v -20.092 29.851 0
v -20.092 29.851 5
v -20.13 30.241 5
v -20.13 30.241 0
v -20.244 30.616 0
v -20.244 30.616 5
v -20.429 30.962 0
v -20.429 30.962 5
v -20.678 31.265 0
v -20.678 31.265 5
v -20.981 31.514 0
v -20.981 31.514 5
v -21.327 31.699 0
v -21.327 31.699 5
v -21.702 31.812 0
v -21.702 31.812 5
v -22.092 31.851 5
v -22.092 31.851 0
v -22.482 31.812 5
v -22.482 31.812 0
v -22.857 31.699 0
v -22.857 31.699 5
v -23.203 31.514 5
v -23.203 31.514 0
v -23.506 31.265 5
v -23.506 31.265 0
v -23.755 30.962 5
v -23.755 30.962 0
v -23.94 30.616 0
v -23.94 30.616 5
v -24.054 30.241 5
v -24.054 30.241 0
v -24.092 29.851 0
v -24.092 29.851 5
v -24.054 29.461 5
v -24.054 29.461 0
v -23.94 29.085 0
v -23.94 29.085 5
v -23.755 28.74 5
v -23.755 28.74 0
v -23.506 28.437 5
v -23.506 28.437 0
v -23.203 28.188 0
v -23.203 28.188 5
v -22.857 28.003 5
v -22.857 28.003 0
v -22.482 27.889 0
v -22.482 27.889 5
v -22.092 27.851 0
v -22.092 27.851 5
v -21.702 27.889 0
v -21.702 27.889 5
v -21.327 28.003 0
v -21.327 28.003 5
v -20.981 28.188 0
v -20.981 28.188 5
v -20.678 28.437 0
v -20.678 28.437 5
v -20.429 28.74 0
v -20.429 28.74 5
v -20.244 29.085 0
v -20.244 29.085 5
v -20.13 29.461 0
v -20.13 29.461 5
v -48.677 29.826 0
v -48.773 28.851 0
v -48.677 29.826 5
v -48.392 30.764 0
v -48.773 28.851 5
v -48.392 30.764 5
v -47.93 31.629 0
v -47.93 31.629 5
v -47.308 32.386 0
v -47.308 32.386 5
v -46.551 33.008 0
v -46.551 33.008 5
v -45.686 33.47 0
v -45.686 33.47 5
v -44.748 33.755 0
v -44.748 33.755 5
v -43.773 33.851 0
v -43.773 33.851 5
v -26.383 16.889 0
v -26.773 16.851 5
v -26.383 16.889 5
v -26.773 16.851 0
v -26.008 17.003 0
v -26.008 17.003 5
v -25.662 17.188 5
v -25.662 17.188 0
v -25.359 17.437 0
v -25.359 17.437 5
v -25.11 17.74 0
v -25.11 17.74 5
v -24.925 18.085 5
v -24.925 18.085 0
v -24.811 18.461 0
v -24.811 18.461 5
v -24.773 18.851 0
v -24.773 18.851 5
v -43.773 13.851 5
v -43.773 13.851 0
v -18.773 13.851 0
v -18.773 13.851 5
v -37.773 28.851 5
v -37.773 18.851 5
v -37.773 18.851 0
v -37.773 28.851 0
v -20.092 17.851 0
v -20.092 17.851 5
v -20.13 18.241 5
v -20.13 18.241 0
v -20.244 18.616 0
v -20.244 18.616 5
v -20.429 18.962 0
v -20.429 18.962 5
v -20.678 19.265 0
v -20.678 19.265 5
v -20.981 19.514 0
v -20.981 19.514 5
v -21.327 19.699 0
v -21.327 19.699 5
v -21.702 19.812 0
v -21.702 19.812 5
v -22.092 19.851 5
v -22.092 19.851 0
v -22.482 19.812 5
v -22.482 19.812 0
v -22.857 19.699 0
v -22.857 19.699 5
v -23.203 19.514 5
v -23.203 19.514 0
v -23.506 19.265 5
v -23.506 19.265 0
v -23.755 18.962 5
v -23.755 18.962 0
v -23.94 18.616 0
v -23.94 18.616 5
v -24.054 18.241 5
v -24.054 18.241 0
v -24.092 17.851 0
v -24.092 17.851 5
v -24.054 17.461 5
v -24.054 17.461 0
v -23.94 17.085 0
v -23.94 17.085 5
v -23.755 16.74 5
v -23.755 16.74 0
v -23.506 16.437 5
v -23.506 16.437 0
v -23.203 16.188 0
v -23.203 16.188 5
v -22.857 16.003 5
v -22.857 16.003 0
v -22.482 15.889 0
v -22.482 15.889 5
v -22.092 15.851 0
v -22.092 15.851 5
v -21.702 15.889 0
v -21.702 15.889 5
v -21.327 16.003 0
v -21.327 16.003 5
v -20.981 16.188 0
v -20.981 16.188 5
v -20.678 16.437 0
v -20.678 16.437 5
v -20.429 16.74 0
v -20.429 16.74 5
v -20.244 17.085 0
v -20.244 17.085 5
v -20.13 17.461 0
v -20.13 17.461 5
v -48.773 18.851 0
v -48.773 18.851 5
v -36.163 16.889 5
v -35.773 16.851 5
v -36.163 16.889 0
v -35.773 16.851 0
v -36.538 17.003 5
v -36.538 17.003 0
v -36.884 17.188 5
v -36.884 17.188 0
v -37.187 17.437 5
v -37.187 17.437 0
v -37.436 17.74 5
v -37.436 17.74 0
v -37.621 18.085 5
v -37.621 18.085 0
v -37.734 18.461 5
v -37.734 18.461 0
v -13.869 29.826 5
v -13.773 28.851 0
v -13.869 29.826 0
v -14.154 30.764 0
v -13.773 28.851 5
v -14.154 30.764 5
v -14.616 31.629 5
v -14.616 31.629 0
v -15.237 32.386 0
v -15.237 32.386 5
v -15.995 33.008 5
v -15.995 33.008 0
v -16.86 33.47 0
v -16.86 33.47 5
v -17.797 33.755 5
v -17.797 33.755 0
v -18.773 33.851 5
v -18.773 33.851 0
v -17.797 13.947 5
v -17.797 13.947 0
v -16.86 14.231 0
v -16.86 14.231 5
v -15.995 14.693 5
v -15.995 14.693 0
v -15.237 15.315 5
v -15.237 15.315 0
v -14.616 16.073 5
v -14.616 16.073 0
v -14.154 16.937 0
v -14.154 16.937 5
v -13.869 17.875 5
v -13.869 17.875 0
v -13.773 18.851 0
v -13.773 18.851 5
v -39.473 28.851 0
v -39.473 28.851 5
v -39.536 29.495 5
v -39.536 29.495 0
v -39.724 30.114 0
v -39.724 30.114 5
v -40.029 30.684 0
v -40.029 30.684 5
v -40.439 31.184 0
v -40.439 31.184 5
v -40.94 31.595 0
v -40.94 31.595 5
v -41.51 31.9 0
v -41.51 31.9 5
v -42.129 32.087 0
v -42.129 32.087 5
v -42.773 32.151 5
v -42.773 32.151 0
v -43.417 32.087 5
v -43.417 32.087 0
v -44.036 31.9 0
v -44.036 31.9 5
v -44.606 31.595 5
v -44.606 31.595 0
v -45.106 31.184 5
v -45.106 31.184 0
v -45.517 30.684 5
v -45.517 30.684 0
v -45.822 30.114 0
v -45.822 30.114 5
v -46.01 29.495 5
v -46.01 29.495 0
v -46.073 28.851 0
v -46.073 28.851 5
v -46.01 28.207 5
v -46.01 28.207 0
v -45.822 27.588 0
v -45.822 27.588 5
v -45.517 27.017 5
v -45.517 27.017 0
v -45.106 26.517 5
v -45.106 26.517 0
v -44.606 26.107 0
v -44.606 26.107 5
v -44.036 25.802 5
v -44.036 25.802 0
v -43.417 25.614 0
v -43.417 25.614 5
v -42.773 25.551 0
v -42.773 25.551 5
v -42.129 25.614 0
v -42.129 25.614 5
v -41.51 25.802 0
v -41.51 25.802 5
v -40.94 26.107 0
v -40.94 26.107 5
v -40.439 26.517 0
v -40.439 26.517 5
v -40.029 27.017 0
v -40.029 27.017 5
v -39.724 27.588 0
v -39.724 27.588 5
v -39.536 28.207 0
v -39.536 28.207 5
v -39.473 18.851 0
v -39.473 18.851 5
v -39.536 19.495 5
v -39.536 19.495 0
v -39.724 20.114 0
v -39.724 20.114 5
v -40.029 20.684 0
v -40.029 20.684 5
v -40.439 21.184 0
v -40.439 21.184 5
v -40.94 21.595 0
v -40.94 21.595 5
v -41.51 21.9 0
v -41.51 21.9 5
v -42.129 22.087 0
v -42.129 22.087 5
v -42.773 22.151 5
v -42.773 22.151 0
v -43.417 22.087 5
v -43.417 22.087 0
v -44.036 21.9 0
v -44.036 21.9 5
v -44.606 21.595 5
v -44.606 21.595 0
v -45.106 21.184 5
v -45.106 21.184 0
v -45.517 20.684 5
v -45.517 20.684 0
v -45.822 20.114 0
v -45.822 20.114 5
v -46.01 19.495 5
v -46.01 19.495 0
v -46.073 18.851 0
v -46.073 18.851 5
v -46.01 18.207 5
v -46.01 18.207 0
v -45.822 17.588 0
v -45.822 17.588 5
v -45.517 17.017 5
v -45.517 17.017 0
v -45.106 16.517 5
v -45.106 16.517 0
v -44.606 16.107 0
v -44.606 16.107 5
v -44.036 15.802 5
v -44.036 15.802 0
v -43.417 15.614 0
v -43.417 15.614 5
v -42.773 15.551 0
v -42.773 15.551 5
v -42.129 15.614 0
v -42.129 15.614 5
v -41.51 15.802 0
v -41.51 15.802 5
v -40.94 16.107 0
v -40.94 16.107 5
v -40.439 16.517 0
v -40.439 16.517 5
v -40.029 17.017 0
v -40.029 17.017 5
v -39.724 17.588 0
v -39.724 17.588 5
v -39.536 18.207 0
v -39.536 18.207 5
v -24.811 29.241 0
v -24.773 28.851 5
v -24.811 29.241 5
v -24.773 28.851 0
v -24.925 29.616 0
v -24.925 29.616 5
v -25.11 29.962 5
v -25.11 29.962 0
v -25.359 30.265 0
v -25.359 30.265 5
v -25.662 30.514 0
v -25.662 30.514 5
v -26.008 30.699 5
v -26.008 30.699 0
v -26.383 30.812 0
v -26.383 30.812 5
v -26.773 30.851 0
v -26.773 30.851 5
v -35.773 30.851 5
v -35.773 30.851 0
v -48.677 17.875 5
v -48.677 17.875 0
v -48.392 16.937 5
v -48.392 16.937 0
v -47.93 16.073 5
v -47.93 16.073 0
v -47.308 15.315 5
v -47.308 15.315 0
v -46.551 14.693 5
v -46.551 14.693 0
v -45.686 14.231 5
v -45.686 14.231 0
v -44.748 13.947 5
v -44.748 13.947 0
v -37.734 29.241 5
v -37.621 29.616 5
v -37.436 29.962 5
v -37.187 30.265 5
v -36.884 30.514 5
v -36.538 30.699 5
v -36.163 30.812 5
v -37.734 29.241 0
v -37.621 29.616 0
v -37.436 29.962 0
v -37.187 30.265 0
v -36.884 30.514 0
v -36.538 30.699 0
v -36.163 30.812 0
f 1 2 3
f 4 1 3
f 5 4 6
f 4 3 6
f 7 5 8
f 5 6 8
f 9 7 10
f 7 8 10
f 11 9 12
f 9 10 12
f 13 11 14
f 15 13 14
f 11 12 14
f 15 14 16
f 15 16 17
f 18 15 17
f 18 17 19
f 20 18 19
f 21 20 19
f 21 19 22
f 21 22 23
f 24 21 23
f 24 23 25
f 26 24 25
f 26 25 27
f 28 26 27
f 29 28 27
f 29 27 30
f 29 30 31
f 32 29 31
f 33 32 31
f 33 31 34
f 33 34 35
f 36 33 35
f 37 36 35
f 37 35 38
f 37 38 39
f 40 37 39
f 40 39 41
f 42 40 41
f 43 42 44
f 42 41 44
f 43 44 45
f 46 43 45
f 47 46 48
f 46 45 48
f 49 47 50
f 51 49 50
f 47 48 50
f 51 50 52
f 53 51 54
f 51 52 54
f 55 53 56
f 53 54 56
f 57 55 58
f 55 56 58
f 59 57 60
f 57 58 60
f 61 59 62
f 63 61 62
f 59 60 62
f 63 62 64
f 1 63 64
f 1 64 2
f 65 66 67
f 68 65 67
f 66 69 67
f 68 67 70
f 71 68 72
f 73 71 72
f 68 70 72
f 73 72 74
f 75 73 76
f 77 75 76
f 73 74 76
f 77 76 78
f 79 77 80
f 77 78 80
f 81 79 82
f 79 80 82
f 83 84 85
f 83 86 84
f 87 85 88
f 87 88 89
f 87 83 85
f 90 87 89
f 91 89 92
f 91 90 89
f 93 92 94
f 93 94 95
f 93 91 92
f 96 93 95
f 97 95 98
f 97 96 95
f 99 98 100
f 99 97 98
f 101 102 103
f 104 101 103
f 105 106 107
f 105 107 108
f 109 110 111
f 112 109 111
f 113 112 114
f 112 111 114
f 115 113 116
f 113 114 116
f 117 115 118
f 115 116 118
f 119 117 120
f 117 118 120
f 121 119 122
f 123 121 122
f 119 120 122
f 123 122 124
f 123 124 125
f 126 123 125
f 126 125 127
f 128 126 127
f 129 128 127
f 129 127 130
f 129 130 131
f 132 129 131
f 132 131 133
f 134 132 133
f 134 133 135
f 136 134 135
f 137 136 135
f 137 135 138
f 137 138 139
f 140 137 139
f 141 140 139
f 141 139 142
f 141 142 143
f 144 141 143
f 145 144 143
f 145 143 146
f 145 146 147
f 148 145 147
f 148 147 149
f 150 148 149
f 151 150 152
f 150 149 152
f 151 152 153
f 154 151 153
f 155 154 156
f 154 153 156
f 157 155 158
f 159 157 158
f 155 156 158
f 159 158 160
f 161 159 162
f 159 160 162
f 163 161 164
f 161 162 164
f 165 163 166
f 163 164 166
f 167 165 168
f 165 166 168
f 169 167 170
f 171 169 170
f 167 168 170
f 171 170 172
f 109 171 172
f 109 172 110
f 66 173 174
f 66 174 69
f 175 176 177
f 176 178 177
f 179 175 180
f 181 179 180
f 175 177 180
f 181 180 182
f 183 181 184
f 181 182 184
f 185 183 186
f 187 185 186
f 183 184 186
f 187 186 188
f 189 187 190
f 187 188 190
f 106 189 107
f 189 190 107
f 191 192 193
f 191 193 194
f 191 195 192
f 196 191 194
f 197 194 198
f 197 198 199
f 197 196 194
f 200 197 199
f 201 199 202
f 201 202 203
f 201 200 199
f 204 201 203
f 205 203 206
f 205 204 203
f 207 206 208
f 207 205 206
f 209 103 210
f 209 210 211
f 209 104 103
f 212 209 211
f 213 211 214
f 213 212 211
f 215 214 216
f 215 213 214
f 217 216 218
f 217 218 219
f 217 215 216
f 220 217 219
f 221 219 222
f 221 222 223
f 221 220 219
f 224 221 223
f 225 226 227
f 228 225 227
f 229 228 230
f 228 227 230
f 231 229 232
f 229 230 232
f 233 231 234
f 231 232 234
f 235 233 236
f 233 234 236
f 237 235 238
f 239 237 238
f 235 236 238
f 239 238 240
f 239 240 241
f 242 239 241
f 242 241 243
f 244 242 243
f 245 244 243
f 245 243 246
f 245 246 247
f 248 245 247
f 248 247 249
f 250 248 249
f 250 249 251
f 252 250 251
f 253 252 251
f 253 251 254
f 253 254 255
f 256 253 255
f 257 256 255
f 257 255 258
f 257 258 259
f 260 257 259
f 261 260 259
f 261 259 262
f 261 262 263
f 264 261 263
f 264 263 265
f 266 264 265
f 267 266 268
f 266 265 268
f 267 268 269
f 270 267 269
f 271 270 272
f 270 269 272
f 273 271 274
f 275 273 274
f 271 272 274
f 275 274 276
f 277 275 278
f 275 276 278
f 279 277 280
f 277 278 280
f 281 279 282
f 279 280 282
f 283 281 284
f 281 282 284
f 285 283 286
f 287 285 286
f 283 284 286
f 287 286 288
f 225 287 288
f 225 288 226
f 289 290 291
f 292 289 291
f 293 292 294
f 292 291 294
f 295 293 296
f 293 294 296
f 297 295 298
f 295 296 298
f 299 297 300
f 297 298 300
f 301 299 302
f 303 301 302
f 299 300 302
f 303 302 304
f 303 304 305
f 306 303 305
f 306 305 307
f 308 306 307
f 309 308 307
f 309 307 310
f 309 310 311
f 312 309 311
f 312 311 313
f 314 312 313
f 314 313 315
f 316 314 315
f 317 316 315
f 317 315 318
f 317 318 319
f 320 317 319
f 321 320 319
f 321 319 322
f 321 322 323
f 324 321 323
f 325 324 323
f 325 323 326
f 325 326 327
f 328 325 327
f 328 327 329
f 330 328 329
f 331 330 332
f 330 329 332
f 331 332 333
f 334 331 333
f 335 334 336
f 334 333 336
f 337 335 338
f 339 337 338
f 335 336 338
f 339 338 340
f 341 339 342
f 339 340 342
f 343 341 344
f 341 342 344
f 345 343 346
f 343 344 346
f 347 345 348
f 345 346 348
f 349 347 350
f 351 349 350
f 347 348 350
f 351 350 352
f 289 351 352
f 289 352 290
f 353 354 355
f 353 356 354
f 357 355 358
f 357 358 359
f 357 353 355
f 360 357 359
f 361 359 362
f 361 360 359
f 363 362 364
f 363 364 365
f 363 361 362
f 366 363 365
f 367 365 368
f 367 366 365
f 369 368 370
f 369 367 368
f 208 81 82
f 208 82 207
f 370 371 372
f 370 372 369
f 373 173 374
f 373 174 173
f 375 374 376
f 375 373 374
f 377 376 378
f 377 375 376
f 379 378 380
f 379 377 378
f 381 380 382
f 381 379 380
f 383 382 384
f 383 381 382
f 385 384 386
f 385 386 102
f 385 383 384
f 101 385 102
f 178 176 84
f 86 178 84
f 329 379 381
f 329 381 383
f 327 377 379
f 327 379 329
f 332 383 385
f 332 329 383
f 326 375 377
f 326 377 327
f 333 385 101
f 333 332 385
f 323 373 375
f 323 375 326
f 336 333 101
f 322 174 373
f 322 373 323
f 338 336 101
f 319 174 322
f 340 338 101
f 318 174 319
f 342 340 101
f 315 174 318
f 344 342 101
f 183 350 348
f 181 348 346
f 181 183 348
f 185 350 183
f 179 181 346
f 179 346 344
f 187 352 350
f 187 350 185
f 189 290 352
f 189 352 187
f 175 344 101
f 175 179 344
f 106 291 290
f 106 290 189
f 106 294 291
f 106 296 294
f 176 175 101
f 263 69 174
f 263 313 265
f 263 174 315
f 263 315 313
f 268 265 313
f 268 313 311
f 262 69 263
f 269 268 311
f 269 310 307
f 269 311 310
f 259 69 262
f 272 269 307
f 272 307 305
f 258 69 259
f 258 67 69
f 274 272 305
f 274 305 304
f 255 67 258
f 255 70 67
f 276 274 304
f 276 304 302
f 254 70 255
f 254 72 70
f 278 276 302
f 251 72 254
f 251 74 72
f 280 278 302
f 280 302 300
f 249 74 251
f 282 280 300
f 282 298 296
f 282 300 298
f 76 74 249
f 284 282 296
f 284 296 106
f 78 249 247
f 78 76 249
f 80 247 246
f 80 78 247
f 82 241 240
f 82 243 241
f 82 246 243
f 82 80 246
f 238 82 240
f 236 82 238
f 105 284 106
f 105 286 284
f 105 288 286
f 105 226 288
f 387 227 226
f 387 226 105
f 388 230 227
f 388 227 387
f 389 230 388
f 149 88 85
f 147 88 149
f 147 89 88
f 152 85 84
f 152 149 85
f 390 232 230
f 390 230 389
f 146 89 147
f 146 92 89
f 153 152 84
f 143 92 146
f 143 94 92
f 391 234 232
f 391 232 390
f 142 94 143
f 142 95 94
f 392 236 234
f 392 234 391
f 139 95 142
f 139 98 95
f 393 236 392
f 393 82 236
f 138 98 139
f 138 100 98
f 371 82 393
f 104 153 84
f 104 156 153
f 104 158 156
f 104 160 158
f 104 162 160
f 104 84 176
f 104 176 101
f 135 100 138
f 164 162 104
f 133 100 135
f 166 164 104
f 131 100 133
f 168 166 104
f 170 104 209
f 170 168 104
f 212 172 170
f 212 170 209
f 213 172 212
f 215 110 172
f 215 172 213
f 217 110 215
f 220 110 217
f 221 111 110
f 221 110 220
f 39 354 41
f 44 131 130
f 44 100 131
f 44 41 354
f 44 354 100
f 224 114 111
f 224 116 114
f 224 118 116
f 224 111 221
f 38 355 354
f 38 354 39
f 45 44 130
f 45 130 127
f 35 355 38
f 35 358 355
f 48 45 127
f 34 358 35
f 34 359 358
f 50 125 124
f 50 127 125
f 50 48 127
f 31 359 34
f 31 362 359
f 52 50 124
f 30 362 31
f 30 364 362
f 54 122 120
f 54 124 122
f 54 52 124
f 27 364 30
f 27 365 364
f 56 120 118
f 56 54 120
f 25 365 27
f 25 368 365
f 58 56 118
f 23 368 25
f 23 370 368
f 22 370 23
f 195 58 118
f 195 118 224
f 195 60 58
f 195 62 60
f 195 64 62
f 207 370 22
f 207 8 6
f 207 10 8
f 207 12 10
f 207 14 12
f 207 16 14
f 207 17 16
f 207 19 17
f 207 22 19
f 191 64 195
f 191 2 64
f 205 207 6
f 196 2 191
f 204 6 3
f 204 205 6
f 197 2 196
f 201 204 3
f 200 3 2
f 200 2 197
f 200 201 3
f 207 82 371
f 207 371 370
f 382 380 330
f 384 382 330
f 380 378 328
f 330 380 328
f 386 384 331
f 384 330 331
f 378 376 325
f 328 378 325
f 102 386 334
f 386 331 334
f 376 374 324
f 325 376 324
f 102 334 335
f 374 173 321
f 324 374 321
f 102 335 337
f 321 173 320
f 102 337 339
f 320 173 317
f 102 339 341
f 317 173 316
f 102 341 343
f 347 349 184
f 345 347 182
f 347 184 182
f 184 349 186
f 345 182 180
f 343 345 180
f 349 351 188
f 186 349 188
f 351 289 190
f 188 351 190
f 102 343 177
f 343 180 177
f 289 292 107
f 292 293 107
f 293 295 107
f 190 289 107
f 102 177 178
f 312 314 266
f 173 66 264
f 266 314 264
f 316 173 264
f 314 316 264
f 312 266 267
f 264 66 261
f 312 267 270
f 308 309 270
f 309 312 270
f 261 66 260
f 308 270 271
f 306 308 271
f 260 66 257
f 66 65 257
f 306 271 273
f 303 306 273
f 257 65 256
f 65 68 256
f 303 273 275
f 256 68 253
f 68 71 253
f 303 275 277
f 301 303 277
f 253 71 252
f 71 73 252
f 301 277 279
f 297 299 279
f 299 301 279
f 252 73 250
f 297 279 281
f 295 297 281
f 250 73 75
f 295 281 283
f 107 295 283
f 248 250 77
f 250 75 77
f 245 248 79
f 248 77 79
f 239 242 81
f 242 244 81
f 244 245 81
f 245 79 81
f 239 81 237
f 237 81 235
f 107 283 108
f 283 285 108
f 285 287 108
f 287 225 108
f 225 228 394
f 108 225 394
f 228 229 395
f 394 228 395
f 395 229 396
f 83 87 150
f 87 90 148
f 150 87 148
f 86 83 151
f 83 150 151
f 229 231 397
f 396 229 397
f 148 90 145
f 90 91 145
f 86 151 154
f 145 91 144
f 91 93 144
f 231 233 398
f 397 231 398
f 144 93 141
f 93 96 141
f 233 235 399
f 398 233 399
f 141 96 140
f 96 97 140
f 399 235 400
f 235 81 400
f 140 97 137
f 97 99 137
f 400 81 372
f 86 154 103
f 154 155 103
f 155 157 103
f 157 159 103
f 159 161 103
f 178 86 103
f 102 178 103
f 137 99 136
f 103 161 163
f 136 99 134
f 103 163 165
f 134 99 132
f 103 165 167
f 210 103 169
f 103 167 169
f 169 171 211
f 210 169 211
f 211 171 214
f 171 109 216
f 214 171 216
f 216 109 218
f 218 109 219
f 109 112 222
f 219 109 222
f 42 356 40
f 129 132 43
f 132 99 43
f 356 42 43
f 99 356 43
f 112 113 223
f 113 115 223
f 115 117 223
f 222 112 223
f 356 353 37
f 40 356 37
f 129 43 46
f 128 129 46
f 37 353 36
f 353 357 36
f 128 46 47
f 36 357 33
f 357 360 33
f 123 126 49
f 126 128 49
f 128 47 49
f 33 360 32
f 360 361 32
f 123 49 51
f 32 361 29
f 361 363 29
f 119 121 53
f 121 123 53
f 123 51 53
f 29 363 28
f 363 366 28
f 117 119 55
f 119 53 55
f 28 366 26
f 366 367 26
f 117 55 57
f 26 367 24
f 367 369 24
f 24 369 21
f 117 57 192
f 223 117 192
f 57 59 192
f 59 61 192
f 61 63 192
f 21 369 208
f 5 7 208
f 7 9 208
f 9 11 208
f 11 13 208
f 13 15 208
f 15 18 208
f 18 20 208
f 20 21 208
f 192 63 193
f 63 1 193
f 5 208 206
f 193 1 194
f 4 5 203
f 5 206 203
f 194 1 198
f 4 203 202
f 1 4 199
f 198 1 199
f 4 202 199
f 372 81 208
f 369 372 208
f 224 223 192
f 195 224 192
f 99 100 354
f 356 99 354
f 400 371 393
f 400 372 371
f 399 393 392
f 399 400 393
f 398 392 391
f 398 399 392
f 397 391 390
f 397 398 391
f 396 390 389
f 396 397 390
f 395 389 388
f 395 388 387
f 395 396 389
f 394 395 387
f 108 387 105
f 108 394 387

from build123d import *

# Parameters (mm, degrees)
ESQUISSE1_W             = 35
ESQUISSE1_H             = 20
BOSS_EXTRU_1_DEPTH      = 5
CONG_1_R                = 5
ESQUISSE7_R             = 2
ENL_V_MAT_EXTRU_2_DEPTH = 10
ESQUISSE6_R             = 3.3
ENL_V_MAT_EXTRU_3_DEPTH = 10
ESQUISSE9_W             = 13
ESQUISSE9_H             = 14
ENL_V_MAT_EXTRU_5_DEPTH = 10
CONG_2_R                = 2


with BuildPart() as part:
    # Esquisse1 → Boss.-Extru.1 (new body)
    with BuildSketch(Plane.XY):
        with Locations((-31.272929194, 23.850830526)):
            Rectangle(ESQUISSE1_W, ESQUISSE1_H)
    extrude(amount=BOSS_EXTRU_1_DEPTH)

    # Congé1
    cong_1_edges = [part.edges().sort_by_distance(p)[0] for p in [
        (-13.772929194, 13.850830526, 2.5),
        (-48.772929194, 13.850830526, 2.5),
        (-48.772929194, 33.850830526, 2.5),
        (-13.772929194, 33.850830526, 2.5),
    ]]
    fillet(cong_1_edges, radius=CONG_1_R)

    # Esquisse7 → Enlèv. mat.-Extru.2 (cut)
    with BuildSketch(Plane.XY.offset(5)):
        with Locations((-22.092006288, 29.850830526)):
            Circle(ESQUISSE7_R)
        with Locations((-22.092006288, 17.850830526)):
            Circle(ESQUISSE7_R)
    extrude(amount=-ENL_V_MAT_EXTRU_2_DEPTH, mode=Mode.SUBTRACT)

    # Esquisse6 → Enlèv. mat.-Extru.3 (cut)
    with BuildSketch(Plane.XY.offset(5)):
        with Locations((-42.772929194, 28.850830526)):
            Circle(ESQUISSE6_R)
        with Locations((-42.772929194, 18.850830526)):
            Circle(ESQUISSE6_R)
    extrude(amount=-ENL_V_MAT_EXTRU_3_DEPTH, mode=Mode.SUBTRACT)

    # Esquisse9 → Enlèv. mat.-Extru.5 (cut)
    with BuildSketch(Plane.XY.offset(5)):
        with Locations((-31.272929194, 23.850830526)):
            Rectangle(ESQUISSE9_W, ESQUISSE9_H)
    extrude(amount=-ENL_V_MAT_EXTRU_5_DEPTH, mode=Mode.SUBTRACT)

    # Congé2
    cong_2_edges = [part.edges().sort_by_distance(p)[0] for p in [
        (-24.772929194, 30.850830526, 2.5),
        (-24.772929194, 16.850830526, 2.5),
        (-37.772929194, 16.850830526, 2.5),
        (-37.772929194, 30.850830526, 2.5),
    ]]
    fillet(cong_2_edges, radius=CONG_2_R)


solid = part.part
